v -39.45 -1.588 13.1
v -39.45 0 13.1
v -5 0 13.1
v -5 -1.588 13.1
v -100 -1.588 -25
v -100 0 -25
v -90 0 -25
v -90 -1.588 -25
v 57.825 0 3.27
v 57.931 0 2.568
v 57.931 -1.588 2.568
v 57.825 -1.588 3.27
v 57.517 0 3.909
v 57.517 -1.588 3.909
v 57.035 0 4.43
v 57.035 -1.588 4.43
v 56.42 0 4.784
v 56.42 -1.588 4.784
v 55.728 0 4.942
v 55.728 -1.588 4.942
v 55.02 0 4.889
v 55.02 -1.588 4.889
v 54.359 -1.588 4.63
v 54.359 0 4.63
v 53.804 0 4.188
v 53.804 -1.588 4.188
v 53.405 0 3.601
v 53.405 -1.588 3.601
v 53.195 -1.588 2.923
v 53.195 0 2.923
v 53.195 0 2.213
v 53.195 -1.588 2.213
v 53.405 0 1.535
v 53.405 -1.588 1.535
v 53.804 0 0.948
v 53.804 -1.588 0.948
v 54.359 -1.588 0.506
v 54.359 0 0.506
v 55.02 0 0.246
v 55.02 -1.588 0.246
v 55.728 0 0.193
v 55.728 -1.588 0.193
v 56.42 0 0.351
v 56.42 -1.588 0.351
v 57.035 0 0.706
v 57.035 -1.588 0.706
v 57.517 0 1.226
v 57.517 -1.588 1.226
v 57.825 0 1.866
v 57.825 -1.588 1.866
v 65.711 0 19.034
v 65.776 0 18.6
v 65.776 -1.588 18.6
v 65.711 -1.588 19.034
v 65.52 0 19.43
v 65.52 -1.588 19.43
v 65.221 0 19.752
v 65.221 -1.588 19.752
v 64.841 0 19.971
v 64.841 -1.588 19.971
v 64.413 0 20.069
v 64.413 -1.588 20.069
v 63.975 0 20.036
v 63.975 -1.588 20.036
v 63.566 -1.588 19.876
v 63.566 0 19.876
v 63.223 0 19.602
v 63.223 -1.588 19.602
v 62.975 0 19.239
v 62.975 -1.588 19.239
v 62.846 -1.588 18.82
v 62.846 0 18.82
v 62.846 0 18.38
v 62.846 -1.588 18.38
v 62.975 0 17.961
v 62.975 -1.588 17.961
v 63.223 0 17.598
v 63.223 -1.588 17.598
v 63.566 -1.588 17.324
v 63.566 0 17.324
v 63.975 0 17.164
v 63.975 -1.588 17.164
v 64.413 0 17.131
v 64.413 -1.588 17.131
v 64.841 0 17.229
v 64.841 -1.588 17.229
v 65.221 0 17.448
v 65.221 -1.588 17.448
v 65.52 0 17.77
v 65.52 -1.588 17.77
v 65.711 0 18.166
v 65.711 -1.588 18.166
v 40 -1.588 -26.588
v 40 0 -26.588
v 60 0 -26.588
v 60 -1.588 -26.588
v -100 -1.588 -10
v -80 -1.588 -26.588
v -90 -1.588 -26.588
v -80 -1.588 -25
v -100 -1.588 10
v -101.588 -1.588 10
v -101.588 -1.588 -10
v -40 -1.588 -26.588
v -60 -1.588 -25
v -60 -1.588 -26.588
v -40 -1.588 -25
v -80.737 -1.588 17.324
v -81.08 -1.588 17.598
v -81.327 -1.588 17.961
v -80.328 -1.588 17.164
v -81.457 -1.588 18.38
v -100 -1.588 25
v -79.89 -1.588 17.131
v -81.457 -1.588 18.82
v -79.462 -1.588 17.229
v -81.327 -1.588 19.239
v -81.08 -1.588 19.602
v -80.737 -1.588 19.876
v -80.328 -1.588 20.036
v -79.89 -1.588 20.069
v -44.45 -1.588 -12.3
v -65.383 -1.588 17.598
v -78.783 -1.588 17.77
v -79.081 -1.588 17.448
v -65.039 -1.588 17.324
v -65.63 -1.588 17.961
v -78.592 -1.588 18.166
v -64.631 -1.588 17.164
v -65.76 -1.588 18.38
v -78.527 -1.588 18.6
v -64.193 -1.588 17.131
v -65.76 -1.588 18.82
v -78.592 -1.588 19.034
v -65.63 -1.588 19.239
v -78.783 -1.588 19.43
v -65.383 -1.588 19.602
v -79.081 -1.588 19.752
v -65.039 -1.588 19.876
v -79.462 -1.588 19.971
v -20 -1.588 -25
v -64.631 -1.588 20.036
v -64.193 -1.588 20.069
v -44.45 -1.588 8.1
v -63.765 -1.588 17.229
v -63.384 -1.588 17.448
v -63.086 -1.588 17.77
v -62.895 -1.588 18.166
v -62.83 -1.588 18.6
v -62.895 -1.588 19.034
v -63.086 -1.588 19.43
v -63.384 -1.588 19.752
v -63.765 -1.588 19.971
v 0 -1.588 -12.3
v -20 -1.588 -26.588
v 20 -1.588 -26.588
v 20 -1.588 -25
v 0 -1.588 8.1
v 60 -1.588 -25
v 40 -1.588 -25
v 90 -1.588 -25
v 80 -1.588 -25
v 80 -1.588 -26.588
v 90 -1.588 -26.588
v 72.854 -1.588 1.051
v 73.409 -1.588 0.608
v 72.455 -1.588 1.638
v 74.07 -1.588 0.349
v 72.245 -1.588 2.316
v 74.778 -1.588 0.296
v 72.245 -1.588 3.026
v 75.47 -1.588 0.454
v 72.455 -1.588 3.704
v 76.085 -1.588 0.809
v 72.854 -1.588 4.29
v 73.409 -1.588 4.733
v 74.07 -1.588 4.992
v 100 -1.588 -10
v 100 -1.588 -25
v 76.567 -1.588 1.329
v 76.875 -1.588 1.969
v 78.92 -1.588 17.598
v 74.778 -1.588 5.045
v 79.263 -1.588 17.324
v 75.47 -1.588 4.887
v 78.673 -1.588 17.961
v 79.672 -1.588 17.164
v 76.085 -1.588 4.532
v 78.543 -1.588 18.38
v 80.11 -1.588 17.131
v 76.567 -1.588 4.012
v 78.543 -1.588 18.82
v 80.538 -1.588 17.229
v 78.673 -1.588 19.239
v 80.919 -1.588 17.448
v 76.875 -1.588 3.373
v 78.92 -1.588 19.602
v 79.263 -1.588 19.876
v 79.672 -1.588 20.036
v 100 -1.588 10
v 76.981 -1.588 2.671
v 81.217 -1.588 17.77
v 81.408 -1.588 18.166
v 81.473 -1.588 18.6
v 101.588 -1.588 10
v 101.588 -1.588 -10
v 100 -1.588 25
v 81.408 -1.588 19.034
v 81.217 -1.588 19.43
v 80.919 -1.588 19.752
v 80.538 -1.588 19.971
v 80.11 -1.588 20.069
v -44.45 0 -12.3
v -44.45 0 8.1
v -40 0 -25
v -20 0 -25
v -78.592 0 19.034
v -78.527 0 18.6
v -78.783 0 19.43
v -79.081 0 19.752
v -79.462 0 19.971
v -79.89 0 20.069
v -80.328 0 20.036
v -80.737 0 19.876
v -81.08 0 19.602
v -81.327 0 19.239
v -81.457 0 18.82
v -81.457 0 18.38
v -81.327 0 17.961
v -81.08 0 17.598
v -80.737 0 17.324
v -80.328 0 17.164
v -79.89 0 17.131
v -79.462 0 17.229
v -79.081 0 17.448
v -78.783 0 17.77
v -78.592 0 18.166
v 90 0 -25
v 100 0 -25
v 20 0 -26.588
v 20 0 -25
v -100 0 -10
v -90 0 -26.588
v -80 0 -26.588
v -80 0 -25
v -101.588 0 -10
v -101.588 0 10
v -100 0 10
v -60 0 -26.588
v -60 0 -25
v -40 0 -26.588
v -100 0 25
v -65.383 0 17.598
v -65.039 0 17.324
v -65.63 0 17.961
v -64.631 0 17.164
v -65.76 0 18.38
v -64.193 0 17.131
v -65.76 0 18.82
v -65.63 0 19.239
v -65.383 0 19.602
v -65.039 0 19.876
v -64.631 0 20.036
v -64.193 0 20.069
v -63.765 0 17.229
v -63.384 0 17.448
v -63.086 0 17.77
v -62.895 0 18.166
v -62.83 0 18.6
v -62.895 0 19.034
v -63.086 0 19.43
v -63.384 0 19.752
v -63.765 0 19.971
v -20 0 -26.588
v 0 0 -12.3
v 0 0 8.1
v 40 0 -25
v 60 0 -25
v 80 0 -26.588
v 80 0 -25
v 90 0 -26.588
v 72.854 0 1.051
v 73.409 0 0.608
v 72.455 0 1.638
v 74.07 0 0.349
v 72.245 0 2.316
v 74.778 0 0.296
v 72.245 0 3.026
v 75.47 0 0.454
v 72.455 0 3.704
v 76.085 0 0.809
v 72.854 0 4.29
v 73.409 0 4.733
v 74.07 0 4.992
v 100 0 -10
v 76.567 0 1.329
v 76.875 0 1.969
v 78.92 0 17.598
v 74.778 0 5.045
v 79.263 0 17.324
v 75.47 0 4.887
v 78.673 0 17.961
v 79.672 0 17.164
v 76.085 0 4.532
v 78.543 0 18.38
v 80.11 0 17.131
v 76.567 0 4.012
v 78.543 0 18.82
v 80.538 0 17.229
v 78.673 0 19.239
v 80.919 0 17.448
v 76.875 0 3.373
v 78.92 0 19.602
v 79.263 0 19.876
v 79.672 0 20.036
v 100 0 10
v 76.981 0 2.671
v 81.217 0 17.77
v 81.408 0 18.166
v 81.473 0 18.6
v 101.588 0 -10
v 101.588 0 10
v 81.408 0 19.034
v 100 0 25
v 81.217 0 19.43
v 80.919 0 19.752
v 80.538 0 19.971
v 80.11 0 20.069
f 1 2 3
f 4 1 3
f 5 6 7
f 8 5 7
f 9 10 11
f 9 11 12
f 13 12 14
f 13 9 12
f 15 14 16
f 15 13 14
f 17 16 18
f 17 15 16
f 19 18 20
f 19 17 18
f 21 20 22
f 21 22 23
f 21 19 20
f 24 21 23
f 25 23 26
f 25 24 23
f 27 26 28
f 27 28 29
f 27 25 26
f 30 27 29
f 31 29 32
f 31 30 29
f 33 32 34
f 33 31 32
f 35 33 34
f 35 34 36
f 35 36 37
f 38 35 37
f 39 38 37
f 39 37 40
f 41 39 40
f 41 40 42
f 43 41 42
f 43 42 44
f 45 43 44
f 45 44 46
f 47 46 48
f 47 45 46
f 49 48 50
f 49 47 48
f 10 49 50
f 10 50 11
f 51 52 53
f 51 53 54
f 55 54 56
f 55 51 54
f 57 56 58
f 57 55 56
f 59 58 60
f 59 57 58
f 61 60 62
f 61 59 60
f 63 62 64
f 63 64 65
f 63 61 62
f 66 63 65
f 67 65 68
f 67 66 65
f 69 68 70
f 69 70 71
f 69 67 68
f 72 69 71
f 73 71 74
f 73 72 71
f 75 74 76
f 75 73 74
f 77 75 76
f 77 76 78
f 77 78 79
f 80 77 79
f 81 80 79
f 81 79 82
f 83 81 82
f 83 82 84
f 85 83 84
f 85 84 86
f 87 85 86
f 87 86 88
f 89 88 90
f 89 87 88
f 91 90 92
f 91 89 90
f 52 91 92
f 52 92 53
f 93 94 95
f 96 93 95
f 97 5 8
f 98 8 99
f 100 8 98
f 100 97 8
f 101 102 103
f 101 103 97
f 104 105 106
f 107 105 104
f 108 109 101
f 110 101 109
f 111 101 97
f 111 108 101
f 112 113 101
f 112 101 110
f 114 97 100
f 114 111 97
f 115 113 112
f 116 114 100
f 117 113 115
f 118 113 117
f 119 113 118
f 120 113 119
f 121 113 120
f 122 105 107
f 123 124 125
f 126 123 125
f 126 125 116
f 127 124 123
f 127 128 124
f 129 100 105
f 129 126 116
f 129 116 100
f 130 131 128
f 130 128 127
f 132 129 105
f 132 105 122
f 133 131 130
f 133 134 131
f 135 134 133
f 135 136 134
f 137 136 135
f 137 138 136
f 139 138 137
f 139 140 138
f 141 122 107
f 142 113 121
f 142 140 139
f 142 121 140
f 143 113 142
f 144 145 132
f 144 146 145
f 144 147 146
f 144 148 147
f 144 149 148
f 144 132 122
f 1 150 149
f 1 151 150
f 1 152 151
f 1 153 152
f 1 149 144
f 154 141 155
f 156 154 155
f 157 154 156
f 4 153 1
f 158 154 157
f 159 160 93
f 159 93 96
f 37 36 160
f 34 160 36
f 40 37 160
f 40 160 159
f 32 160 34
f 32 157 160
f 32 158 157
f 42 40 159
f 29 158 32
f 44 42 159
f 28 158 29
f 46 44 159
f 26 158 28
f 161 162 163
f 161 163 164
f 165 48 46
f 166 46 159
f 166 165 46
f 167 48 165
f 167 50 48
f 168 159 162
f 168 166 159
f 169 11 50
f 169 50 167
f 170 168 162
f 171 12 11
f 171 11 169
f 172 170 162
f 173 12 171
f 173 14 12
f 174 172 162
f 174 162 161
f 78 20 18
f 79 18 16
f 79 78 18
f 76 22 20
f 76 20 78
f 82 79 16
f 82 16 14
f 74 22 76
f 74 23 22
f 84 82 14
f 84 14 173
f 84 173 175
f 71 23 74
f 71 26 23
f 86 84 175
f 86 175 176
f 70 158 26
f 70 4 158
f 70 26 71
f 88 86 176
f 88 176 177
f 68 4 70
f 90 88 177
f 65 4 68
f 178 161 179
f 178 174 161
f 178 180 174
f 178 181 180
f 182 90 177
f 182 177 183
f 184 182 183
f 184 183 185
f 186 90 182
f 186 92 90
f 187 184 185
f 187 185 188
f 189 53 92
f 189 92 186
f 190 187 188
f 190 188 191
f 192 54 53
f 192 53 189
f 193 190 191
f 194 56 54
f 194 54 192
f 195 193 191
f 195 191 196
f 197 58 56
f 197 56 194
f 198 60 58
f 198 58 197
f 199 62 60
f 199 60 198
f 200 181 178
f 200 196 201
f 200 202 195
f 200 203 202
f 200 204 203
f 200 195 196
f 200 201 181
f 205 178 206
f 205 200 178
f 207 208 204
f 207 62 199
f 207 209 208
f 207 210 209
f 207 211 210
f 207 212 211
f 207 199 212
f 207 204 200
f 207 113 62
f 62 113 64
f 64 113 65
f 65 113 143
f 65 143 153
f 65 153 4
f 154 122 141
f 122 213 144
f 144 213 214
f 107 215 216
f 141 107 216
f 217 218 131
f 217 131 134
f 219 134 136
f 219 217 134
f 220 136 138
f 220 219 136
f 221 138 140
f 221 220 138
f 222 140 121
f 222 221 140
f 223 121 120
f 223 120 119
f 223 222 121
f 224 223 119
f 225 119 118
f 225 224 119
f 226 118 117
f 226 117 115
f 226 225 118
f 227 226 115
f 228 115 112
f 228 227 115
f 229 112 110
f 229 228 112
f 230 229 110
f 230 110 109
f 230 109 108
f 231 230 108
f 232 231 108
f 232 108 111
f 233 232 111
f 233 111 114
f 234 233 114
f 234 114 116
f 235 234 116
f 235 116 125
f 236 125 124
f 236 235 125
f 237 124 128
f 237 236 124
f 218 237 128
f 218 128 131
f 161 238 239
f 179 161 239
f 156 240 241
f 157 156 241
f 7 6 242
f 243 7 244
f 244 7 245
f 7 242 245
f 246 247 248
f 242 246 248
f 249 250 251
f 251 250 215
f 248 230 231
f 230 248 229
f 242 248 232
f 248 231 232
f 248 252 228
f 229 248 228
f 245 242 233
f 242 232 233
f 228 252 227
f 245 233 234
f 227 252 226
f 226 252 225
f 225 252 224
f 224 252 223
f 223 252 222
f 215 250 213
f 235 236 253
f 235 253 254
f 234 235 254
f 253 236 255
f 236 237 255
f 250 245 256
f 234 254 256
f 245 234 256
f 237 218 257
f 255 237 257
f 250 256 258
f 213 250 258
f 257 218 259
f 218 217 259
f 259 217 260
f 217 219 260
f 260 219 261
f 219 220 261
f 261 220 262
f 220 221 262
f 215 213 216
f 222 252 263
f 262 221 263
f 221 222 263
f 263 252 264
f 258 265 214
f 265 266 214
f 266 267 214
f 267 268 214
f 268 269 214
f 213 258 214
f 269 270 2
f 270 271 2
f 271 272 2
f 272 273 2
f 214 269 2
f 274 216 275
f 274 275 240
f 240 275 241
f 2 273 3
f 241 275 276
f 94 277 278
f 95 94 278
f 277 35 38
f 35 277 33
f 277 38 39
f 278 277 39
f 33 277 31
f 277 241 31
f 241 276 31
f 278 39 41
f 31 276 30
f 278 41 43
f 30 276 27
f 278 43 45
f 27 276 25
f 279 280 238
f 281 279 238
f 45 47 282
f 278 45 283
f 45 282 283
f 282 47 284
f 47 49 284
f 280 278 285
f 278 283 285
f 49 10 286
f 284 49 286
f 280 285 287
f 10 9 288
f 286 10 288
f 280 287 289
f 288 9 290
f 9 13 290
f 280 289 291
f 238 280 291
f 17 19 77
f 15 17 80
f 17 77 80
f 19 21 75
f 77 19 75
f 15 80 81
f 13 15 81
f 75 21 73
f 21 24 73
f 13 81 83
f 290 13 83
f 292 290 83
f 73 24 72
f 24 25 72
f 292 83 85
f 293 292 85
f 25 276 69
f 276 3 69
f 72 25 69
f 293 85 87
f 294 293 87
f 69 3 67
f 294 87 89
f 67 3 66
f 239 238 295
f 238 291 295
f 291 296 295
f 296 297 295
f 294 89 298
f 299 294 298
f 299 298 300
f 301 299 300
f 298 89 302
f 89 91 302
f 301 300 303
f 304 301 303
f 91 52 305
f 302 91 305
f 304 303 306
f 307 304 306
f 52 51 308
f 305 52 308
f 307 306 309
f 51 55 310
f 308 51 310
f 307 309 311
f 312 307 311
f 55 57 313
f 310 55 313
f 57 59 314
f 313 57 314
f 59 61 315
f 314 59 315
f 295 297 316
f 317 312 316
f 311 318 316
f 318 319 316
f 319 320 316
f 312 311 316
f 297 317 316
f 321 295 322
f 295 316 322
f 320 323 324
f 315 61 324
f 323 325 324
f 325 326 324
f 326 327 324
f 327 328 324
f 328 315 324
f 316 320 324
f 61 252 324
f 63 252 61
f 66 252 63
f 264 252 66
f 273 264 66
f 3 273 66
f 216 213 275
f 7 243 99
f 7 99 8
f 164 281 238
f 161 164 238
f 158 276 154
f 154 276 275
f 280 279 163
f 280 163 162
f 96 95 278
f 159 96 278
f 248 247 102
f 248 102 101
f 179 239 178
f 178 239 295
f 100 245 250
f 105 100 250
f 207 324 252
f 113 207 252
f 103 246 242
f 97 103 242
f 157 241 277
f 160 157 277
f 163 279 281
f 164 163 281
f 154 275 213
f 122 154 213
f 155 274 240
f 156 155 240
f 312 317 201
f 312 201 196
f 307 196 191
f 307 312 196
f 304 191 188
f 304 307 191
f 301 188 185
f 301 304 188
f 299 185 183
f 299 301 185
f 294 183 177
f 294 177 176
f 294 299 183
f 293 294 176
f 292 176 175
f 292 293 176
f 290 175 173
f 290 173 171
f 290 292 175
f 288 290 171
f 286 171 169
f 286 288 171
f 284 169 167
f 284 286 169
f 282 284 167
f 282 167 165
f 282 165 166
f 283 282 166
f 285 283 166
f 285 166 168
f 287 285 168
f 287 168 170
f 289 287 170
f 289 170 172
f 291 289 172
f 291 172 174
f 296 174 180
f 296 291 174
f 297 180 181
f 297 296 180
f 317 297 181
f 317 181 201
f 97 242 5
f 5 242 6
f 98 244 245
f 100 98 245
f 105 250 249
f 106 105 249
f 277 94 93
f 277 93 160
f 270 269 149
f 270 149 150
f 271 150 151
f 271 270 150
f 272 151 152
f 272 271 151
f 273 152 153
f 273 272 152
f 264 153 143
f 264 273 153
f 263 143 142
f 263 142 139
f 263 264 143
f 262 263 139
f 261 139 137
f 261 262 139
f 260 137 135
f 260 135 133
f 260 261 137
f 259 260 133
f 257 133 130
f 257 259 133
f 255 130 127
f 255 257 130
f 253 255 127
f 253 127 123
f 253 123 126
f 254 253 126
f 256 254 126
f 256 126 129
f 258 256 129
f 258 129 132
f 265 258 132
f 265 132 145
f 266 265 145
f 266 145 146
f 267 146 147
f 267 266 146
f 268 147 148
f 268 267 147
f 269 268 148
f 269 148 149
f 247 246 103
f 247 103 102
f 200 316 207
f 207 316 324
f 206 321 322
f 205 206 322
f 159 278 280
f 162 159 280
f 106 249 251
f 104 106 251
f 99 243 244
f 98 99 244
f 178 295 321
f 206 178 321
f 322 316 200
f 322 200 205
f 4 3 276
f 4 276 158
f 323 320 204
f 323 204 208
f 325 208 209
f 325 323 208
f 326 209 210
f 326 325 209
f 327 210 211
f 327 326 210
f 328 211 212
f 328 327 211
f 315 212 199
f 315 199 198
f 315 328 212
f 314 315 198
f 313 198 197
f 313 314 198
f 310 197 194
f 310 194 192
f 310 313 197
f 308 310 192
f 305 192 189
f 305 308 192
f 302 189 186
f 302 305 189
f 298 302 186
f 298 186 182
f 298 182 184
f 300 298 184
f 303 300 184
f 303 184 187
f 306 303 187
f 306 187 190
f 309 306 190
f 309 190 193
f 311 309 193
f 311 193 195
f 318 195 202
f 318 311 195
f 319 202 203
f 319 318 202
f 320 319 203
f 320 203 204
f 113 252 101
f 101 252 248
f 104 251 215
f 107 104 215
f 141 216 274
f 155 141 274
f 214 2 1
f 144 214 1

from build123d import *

# Parameters (mm, degrees)
F0_R     = 1.4732
F0_R_2   = 2.38125
F0_W     = 1.5875
F0_H     = 20
F0_W_2   = 10
F0_H_2   = 1.5875
F0_W_3   = 20
F1_DEPTH = 1.5875
F2_SIZE  = 5


# Not quite as in the source:
# - a length typed as a fraction of an inch, garbled in the dataset ("3 / 203.2 mm" for 3/8 in), is restored


with BuildPart() as f1:
    # F0 (on Front) → F1 (new body)
    with BuildSketch(Plane.XZ):
        Polygon((100, 10), (100, 25), (-100, 25), (-100, 10), (-100, -10), (-100, -25), (-90, -25), (-80, -25), (-60, -25), (-44.45, -25), (-44.45, -12.3), (-44.45, 13.1), (0, 13.1), (0, -12.3), (0, -25), (20, -25), (40, -25), (60, -25), (80, -25), (90, -25), (100, -25), (100, -10), align=None)
        with Locations((-80, 18.6)):
            Circle(F0_R, mode=Mode.SUBTRACT)
        with Locations((-64.3028, 18.6)):
            Circle(F0_R, mode=Mode.SUBTRACT)
        with Locations((55.55, 2.5678405073)):
            Circle(F0_R_2, mode=Mode.SUBTRACT)
        with Locations((74.6, 2.6706890203)):
            Circle(F0_R_2, mode=Mode.SUBTRACT)
        with Locations((64.3028, 18.6)):
            Circle(F0_R, mode=Mode.SUBTRACT)
        with Locations((80, 18.6)):
            Circle(F0_R, mode=Mode.SUBTRACT)
        with Locations((100.79375, 0)):
            Rectangle(F0_W, F0_H)
        with Locations((-100.79375, 0)):
            Rectangle(F0_W, F0_H)
        with Locations((85, -25.79375)):
            Rectangle(F0_W_2, F0_H_2)
        with Locations((-85, -25.79375)):
            Rectangle(F0_W_2, F0_H_2)
        with Locations((50, -25.79375)):
            Rectangle(F0_W_3, F0_H_2)
        Polygon((-44.45, -25), (-60, -25), (-60, -26.5875), (-40, -26.5875), (-40, -25), align=None)
        Polygon((-44.45, -12.3), (-44.45, -25), (-40, -25), (-20, -25), (0, -25), (0, -12.3), align=None)
        Polygon((20, -26.5875), (20, -25), (0, -25), (-20, -25), (-20, -26.5875), align=None)
    extrude(amount=F1_DEPTH)

    # F2
    f2_edges = [f1.edges().sort_by_distance(p)[0] for p in [
        (-44.45, -0.79375, 13.1),
        (0, -0.79375, 13.1),
    ]]
    chamfer(f2_edges, length=F2_SIZE)


solid = f1.part
